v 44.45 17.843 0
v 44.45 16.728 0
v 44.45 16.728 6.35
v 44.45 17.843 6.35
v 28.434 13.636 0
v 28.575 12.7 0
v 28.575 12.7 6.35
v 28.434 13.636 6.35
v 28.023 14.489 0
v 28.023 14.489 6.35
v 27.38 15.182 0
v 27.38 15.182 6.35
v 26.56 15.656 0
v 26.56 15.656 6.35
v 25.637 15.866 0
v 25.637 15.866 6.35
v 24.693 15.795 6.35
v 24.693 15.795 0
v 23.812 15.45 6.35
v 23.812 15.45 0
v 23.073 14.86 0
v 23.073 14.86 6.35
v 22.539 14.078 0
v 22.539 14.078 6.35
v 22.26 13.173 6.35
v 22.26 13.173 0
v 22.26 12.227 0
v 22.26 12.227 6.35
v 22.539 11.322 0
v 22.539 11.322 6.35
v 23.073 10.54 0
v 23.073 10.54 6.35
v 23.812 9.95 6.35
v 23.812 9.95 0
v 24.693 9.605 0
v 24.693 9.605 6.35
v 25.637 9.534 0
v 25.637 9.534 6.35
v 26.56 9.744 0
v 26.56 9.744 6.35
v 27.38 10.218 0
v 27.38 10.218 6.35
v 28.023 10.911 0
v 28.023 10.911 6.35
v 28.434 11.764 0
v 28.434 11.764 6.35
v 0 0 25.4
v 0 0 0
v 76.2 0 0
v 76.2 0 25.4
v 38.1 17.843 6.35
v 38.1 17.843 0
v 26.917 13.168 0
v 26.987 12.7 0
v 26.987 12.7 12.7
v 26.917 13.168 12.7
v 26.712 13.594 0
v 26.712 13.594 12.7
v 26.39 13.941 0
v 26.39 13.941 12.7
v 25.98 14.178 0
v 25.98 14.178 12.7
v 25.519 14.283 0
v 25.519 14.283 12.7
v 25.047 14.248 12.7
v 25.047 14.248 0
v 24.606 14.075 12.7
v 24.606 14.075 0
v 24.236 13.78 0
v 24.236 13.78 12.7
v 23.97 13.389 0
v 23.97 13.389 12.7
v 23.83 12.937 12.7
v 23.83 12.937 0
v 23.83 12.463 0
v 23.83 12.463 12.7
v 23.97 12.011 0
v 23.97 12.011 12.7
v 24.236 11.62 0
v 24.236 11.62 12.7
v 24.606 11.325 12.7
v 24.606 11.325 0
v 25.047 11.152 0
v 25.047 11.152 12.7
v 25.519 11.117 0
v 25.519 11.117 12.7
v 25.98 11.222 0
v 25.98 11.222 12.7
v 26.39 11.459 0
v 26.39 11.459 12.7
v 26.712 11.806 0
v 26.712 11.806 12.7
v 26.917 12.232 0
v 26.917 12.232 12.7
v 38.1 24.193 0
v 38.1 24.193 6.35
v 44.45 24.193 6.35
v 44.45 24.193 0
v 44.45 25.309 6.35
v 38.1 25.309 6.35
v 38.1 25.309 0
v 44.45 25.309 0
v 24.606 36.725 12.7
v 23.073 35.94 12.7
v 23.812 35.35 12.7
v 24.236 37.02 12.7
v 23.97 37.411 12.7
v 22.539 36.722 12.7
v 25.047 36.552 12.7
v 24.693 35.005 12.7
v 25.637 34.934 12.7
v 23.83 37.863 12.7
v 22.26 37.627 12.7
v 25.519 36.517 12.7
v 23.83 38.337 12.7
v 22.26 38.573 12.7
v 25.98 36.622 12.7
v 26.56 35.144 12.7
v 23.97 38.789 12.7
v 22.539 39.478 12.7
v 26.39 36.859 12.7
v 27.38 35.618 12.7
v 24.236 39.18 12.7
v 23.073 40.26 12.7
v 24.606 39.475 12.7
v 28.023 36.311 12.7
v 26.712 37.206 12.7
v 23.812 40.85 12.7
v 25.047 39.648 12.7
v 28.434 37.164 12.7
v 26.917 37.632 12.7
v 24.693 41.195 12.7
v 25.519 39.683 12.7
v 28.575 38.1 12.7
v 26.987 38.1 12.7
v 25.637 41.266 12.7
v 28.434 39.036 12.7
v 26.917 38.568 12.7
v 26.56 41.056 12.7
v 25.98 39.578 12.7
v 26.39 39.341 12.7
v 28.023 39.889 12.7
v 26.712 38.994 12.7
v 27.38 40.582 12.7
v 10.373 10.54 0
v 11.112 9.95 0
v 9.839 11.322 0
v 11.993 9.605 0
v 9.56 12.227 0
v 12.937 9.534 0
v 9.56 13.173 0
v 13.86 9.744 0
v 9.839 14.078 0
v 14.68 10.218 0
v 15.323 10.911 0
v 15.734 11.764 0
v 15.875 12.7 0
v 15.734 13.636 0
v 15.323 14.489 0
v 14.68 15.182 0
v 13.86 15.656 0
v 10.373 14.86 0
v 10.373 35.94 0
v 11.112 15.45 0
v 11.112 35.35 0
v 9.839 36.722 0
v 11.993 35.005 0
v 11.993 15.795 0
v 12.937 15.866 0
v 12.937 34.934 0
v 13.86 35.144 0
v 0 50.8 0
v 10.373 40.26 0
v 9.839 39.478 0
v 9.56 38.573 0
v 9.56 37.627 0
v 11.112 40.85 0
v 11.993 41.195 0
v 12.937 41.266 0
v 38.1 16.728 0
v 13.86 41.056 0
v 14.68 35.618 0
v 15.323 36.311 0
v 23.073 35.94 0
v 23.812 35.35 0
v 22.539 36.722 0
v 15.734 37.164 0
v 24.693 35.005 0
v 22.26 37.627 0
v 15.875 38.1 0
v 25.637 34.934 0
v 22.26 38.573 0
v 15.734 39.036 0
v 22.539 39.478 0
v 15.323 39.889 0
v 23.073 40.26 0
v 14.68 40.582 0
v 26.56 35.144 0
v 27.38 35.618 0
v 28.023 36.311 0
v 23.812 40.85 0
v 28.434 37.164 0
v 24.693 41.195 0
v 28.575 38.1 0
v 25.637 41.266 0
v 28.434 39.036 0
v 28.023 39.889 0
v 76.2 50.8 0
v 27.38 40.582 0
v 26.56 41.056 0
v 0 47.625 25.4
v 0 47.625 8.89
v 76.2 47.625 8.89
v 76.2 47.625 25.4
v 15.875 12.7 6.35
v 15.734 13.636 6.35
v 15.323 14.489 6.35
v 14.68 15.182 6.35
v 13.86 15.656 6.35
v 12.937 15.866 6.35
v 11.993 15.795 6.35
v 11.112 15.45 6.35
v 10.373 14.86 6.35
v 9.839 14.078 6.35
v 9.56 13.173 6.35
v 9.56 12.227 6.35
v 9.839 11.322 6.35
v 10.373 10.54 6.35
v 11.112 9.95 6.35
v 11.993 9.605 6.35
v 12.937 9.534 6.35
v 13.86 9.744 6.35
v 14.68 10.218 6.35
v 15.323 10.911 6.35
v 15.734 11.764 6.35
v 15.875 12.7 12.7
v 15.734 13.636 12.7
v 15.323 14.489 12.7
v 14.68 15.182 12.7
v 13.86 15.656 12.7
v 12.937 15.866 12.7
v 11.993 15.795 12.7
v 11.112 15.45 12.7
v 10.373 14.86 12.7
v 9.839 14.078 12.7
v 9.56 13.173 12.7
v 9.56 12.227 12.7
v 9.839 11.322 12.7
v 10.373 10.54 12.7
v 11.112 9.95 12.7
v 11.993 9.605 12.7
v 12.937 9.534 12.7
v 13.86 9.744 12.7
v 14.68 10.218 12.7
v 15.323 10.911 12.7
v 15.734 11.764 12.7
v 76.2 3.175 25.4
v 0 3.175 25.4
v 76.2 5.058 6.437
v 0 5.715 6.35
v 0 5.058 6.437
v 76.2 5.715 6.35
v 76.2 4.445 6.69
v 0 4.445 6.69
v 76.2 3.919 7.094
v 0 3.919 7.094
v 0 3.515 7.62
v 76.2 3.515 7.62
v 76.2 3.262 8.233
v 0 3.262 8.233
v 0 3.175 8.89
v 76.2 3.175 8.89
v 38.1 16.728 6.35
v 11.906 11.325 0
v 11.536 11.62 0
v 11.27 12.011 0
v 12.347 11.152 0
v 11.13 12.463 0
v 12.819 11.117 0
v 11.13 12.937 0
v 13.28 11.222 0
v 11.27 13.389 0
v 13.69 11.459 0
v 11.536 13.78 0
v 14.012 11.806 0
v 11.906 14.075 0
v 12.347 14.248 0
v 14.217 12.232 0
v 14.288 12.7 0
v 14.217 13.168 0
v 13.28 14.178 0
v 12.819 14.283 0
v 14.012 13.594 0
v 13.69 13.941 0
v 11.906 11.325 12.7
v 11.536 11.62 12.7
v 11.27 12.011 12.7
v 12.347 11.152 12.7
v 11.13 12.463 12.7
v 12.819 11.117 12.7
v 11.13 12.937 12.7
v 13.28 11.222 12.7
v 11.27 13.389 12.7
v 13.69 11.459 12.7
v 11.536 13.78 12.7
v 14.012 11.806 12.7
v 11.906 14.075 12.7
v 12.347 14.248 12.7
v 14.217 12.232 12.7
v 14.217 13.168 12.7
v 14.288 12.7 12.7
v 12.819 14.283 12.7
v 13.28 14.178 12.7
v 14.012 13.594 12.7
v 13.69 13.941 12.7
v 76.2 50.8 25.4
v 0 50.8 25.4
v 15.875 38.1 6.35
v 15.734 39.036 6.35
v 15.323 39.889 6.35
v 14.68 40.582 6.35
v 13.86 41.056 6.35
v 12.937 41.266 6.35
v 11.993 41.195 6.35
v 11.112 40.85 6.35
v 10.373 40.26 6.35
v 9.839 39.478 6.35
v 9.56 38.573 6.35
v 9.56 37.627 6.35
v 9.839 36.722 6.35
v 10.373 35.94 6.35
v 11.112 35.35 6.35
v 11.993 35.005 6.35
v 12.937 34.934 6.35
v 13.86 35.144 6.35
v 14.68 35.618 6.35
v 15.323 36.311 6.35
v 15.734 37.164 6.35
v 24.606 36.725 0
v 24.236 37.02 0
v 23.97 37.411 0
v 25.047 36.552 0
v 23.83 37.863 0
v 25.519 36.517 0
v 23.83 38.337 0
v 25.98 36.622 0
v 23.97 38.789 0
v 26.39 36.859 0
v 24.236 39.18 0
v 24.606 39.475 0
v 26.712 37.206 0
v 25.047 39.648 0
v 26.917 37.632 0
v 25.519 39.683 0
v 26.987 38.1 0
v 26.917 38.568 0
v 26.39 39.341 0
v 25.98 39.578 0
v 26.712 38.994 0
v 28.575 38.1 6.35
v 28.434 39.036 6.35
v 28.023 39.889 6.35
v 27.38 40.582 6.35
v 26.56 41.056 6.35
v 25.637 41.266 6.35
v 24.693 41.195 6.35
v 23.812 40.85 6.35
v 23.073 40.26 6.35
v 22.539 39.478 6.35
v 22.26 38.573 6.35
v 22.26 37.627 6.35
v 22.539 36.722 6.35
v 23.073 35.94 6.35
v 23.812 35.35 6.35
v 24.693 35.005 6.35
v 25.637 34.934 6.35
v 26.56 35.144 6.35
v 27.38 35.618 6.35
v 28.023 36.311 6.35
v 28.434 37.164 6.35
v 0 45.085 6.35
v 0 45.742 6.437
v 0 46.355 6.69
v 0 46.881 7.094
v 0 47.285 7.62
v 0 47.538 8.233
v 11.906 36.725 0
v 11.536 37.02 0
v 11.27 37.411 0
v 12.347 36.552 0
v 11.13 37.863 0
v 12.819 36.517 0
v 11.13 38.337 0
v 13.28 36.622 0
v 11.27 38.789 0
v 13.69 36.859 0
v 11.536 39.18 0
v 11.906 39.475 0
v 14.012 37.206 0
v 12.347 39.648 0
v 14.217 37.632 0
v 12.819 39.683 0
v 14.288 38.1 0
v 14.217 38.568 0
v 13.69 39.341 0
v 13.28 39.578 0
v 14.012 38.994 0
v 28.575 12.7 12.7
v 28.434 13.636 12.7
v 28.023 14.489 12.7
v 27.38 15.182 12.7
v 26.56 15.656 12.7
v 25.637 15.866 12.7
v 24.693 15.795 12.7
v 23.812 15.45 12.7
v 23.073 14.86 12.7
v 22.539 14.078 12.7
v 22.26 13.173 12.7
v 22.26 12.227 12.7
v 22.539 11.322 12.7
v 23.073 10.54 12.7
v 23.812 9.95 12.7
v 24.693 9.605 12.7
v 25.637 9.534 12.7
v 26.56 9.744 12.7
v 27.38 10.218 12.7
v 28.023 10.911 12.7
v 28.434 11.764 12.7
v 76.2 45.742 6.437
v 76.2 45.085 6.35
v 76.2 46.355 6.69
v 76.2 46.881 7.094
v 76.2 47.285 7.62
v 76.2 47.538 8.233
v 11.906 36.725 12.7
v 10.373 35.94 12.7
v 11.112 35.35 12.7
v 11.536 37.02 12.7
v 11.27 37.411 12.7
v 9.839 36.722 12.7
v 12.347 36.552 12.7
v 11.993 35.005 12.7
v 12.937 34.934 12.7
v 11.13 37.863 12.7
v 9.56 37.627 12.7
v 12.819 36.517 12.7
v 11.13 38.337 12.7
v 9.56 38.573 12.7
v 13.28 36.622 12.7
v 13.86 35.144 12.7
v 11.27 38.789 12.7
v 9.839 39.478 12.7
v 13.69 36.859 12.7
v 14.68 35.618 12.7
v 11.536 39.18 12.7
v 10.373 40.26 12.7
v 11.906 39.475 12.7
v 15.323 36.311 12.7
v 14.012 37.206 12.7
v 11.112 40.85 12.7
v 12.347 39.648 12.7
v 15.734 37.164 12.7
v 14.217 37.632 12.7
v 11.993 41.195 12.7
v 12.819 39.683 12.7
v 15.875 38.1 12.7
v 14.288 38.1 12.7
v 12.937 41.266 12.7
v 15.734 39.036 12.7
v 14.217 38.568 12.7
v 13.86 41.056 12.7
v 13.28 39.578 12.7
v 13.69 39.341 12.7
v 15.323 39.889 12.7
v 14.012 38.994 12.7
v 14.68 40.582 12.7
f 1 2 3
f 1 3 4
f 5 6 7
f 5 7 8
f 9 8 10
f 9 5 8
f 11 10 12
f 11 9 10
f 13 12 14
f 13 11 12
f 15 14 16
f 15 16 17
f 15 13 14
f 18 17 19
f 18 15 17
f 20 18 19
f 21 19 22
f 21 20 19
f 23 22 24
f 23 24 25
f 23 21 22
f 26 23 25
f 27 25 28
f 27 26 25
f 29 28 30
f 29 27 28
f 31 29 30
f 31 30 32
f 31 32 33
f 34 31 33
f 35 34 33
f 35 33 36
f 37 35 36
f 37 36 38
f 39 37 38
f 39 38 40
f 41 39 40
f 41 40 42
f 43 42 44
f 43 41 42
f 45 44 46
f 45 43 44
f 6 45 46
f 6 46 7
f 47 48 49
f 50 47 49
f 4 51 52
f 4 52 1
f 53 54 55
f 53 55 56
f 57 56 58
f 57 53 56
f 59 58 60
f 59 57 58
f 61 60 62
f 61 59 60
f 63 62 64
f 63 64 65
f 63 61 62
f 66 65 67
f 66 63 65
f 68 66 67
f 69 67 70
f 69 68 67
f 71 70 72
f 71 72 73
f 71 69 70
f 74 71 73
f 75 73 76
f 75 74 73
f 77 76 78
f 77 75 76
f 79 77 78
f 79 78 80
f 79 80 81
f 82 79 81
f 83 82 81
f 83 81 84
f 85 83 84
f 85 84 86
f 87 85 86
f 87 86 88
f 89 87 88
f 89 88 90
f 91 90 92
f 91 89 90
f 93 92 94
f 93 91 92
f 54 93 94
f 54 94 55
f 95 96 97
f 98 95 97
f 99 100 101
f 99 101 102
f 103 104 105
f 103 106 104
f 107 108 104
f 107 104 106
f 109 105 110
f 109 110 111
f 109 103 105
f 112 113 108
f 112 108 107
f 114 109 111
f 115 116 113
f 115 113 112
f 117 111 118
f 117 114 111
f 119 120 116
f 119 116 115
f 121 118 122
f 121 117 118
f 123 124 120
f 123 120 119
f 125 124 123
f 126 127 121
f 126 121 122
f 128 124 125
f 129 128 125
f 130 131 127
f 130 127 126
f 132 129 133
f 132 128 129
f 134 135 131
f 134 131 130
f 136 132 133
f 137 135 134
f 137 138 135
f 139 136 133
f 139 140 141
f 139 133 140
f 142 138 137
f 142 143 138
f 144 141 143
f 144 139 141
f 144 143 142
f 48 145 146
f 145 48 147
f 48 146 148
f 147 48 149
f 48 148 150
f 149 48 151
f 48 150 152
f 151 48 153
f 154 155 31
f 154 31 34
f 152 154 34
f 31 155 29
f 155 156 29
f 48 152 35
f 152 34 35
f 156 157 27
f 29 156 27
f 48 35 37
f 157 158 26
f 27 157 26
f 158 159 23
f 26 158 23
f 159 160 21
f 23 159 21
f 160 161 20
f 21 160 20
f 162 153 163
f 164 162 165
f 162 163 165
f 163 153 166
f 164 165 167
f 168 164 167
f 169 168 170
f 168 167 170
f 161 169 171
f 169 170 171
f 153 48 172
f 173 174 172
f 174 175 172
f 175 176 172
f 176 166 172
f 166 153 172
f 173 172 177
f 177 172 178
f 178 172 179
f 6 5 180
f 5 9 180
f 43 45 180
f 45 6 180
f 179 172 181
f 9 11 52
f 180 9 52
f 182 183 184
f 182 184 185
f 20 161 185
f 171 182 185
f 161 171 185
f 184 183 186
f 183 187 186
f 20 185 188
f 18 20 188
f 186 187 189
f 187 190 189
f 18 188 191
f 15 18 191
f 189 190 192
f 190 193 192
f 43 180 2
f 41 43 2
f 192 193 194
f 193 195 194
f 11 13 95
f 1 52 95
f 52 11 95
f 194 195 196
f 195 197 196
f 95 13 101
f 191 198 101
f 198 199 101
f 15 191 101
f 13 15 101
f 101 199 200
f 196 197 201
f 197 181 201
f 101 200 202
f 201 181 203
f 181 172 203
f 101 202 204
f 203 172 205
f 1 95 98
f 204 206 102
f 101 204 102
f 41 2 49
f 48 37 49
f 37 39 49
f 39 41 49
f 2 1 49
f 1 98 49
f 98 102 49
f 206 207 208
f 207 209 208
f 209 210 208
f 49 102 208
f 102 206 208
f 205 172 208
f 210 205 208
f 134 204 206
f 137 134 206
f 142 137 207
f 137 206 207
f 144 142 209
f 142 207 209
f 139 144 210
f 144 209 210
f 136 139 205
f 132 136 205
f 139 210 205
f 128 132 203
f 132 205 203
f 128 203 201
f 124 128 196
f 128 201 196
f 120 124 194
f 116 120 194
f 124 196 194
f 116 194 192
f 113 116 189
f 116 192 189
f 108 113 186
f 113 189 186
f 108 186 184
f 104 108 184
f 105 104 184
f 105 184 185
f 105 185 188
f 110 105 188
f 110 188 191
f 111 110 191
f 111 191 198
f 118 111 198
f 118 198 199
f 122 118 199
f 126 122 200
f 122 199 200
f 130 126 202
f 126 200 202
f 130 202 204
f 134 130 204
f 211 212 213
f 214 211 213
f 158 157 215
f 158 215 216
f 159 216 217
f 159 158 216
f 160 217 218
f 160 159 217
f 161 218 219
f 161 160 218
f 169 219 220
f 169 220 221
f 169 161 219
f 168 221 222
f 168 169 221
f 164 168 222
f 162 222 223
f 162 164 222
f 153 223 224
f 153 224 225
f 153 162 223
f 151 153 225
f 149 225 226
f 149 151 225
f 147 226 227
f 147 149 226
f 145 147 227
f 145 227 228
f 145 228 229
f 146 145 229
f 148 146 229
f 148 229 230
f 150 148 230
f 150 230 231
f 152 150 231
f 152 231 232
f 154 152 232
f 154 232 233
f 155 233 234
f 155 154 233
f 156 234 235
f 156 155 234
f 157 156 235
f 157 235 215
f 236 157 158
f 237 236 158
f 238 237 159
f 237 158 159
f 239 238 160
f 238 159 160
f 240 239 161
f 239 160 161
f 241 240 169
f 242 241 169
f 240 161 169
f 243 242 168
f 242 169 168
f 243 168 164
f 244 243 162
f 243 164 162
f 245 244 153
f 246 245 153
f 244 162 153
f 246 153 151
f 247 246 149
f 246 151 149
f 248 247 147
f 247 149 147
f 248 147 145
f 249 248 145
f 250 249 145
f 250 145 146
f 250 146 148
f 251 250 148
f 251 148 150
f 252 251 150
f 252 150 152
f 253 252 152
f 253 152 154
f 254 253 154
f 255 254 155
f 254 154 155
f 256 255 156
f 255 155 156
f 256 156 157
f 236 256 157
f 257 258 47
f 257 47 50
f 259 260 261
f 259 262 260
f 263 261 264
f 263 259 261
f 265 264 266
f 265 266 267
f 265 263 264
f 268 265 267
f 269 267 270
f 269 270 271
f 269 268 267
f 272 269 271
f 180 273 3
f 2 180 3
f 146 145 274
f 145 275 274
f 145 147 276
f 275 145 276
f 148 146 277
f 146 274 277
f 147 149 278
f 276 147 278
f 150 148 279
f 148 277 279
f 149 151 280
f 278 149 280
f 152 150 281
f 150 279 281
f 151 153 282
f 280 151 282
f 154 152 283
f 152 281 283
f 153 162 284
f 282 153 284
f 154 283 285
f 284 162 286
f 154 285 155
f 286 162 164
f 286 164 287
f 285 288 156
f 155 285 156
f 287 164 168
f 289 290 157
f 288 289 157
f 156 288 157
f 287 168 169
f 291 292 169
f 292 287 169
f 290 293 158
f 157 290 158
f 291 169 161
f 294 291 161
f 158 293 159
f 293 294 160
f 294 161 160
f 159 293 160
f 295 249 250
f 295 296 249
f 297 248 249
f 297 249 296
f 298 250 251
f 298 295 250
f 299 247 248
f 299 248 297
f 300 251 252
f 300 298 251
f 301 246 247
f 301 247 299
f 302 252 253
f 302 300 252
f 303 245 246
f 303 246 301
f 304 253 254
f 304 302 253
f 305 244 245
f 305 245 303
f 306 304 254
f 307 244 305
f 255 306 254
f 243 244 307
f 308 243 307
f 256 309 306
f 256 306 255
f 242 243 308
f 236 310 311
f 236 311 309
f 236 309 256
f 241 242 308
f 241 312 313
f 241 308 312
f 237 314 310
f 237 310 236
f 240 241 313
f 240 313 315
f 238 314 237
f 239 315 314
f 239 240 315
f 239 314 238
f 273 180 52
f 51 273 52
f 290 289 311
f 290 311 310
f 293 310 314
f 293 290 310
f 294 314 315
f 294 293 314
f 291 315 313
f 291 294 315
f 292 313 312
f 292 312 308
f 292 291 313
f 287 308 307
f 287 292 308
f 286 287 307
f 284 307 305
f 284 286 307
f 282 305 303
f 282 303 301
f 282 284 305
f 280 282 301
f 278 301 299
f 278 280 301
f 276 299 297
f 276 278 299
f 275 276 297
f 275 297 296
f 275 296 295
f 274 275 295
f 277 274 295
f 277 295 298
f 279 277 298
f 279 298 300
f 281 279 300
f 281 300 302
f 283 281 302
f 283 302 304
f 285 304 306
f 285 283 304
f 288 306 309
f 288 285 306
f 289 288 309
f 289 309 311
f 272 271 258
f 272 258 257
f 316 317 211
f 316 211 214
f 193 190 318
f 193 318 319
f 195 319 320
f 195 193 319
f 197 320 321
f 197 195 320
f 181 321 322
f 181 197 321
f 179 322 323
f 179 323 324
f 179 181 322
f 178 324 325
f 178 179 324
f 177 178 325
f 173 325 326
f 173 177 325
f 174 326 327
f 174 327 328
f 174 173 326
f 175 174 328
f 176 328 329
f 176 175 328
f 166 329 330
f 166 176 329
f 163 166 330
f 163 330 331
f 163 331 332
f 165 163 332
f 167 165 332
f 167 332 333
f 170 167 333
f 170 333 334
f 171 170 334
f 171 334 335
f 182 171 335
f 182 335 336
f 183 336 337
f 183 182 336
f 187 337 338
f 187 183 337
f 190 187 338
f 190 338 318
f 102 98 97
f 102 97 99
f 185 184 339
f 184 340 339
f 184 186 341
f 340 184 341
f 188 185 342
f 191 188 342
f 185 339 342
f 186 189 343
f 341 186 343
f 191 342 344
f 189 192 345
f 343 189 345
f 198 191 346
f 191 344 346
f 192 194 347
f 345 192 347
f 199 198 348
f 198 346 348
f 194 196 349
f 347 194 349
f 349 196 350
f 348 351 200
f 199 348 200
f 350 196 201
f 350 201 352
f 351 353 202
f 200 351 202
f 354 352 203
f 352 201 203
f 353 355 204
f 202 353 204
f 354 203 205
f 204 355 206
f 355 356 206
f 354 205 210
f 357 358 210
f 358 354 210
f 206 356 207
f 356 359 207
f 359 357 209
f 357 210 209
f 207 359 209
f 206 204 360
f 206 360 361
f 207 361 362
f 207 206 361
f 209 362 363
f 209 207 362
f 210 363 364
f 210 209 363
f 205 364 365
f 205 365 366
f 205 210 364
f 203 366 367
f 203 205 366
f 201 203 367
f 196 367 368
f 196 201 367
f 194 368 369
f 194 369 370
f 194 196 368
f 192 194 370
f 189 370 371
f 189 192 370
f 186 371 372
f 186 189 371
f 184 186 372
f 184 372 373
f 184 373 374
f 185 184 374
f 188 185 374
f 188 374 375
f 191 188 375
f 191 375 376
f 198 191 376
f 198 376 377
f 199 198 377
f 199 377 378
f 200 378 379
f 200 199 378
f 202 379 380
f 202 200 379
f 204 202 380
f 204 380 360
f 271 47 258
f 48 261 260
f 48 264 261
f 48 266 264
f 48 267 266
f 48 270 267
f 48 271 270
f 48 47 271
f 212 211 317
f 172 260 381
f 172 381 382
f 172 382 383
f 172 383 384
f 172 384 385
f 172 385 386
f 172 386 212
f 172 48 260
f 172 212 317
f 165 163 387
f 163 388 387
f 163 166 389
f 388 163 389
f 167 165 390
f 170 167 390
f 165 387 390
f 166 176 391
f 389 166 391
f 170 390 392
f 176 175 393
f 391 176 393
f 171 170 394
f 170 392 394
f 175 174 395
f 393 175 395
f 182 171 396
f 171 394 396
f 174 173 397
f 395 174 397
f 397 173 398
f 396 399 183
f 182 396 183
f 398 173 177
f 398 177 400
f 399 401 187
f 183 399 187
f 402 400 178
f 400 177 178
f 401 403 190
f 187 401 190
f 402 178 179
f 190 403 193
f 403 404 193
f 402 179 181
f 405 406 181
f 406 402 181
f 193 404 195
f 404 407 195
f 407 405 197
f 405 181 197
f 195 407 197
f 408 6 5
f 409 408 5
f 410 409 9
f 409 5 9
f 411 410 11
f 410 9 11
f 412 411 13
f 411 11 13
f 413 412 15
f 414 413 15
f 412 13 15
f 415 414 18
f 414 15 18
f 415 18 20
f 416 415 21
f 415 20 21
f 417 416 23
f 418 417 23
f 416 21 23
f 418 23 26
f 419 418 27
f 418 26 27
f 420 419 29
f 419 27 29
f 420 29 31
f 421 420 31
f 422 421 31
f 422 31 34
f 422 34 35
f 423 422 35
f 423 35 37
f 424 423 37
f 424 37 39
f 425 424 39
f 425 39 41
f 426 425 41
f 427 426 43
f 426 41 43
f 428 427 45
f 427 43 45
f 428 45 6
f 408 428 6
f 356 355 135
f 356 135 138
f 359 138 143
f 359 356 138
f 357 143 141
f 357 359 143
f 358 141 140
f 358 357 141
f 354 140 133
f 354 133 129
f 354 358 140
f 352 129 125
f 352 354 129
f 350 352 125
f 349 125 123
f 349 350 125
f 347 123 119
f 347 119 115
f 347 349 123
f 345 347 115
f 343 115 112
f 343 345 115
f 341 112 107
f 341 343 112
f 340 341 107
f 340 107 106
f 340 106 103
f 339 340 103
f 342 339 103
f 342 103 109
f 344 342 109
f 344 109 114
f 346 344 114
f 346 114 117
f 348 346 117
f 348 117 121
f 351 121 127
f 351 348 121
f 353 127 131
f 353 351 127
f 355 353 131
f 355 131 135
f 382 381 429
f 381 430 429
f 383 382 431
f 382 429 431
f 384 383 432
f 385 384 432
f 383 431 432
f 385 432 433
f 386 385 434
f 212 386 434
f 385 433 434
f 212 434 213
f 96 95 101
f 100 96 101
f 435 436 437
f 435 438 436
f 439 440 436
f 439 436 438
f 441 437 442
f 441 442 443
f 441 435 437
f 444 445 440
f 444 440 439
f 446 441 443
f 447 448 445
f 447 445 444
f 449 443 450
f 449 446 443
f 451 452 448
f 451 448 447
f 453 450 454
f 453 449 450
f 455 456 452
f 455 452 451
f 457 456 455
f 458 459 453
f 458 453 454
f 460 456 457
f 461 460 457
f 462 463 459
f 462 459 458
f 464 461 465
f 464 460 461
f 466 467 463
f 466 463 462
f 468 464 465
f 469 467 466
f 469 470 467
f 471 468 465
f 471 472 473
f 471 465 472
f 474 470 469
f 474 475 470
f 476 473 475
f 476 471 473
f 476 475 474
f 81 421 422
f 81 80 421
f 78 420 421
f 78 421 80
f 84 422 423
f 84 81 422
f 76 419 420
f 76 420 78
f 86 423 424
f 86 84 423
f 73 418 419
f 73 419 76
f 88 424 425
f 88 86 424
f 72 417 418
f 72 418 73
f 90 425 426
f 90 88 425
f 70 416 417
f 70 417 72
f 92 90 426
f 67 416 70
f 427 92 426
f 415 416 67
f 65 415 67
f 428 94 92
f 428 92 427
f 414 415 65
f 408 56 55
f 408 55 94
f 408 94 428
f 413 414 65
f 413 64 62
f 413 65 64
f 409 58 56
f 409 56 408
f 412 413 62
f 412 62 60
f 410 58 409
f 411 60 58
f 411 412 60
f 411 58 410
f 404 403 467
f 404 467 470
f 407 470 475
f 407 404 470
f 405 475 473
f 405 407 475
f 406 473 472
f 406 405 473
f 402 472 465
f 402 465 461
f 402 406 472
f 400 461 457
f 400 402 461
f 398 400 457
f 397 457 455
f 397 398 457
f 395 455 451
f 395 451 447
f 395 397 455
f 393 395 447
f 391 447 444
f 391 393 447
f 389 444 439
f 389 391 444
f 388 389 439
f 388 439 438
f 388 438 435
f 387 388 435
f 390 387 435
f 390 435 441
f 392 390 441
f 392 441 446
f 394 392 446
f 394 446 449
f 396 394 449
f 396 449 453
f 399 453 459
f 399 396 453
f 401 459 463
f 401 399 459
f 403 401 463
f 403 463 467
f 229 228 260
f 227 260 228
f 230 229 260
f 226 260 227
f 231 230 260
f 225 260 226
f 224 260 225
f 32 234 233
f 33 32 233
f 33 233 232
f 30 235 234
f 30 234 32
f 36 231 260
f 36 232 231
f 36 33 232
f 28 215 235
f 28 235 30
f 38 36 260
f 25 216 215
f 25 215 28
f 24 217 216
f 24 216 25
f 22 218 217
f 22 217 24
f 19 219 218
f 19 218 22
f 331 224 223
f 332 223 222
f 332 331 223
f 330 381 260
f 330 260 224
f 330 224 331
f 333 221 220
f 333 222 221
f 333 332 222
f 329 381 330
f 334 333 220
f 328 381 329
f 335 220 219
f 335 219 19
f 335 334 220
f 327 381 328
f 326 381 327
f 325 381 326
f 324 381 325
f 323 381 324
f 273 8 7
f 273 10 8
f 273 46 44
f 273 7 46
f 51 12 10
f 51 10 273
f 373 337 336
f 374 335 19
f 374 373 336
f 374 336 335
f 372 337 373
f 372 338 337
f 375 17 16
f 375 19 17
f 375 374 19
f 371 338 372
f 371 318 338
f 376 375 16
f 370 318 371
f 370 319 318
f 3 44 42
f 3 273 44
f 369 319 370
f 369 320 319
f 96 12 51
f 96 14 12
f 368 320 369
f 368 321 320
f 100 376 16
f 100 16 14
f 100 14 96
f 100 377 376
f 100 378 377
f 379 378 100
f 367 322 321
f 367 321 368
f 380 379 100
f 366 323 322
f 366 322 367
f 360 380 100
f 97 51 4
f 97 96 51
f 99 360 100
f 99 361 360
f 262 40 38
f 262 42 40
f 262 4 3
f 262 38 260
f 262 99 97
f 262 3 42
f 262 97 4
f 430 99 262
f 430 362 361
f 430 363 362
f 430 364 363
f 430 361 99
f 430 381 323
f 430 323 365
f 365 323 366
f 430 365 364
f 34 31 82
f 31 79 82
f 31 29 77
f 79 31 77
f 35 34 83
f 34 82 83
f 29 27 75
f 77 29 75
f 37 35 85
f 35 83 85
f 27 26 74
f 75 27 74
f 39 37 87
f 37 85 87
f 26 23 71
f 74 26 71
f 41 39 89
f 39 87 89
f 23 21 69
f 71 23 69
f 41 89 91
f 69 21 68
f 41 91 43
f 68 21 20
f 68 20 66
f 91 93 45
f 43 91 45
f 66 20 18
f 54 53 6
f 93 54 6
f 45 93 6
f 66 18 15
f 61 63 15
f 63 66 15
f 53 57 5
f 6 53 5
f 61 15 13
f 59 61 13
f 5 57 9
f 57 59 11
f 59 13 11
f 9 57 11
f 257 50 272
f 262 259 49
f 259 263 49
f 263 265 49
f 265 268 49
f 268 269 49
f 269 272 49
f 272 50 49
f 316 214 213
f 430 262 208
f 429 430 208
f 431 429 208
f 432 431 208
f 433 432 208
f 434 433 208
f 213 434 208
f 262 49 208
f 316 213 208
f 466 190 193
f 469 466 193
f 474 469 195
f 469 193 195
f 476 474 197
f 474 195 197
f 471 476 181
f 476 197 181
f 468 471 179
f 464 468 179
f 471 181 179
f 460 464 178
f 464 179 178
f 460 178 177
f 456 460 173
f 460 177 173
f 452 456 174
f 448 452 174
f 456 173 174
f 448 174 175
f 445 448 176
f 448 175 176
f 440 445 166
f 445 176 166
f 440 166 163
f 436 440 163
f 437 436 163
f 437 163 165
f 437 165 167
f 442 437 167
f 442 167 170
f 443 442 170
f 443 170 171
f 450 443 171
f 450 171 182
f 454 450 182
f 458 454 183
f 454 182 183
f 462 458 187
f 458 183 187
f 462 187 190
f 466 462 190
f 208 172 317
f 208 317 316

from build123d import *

# Parameters (mm, degrees)
F0_R     = 3.175
F0_R_2   = 1.5875
F1_DEPTH = 12.7
F0_W     = 76.2
F0_H     = 44.45
F0_W_2   = 6.35
F0_H_2   = 1.11579
F2_DEPTH = 6.35
F0_H_3   = 3.175
F3_DEPTH = 25.4
F4_R     = 2.54


with BuildPart() as f1:
    # F0 (on Top) → F1 (new body)
    with BuildSketch(Plane.XY):
        with Locations((12.7, 38.1)):
            Circle(F0_R)
        with Locations((12.7, 38.1)):
            Circle(F0_R_2, mode=Mode.SUBTRACT)
        with Locations((12.7, 12.7)):
            Circle(F0_R)
        with Locations((12.7, 12.7)):
            Circle(F0_R_2, mode=Mode.SUBTRACT)
        with Locations((25.4, 38.1)):
            Circle(F0_R)
        with Locations((25.4, 38.1)):
            Circle(F0_R_2, mode=Mode.SUBTRACT)
        with Locations((25.4, 12.7)):
            Circle(F0_R)
        with Locations((25.4, 12.7)):
            Circle(F0_R_2, mode=Mode.SUBTRACT)
    extrude(amount=F1_DEPTH)


with BuildPart() as f2:
    # F0 (on Top) → F2 (new body)
    with BuildSketch(Plane.XY):
        with Locations((38.1, 25.4)):
            Rectangle(F0_W, F0_H)
        with Locations((12.7, 12.7)):
            Circle(F0_R, mode=Mode.SUBTRACT)
        with Locations((25.4, 12.7)):
            Circle(F0_R, mode=Mode.SUBTRACT)
        with Locations((41.275, 17.285521)):
            Rectangle(F0_W_2, F0_H_2, mode=Mode.SUBTRACT)
        with Locations((41.275, 24.751311)):
            Rectangle(F0_W_2, F0_H_2, mode=Mode.SUBTRACT)
        with Locations((12.7, 38.1)):
            Circle(F0_R, mode=Mode.SUBTRACT)
        with Locations((25.4, 38.1)):
            Circle(F0_R, mode=Mode.SUBTRACT)
    extrude(amount=F2_DEPTH)

    # F0 (on Top) → F3 (join)
    with BuildSketch(Plane.XY):
        with Locations((38.1, 49.2125)):
            Rectangle(F0_W, F0_H_3)
        with Locations((38.1, 1.5875)):
            Rectangle(F0_W, F0_H_3)
    extrude(amount=F3_DEPTH)

    # F4
    f4_edges = [f2.edges().sort_by_distance(p)[0] for p in [
        (38.1, 47.625, 6.35),
        (38.1, 3.175, 6.35),
    ]]
    fillet(f4_edges, radius=F4_R)


solid = Compound([f1.part, f2.part])
